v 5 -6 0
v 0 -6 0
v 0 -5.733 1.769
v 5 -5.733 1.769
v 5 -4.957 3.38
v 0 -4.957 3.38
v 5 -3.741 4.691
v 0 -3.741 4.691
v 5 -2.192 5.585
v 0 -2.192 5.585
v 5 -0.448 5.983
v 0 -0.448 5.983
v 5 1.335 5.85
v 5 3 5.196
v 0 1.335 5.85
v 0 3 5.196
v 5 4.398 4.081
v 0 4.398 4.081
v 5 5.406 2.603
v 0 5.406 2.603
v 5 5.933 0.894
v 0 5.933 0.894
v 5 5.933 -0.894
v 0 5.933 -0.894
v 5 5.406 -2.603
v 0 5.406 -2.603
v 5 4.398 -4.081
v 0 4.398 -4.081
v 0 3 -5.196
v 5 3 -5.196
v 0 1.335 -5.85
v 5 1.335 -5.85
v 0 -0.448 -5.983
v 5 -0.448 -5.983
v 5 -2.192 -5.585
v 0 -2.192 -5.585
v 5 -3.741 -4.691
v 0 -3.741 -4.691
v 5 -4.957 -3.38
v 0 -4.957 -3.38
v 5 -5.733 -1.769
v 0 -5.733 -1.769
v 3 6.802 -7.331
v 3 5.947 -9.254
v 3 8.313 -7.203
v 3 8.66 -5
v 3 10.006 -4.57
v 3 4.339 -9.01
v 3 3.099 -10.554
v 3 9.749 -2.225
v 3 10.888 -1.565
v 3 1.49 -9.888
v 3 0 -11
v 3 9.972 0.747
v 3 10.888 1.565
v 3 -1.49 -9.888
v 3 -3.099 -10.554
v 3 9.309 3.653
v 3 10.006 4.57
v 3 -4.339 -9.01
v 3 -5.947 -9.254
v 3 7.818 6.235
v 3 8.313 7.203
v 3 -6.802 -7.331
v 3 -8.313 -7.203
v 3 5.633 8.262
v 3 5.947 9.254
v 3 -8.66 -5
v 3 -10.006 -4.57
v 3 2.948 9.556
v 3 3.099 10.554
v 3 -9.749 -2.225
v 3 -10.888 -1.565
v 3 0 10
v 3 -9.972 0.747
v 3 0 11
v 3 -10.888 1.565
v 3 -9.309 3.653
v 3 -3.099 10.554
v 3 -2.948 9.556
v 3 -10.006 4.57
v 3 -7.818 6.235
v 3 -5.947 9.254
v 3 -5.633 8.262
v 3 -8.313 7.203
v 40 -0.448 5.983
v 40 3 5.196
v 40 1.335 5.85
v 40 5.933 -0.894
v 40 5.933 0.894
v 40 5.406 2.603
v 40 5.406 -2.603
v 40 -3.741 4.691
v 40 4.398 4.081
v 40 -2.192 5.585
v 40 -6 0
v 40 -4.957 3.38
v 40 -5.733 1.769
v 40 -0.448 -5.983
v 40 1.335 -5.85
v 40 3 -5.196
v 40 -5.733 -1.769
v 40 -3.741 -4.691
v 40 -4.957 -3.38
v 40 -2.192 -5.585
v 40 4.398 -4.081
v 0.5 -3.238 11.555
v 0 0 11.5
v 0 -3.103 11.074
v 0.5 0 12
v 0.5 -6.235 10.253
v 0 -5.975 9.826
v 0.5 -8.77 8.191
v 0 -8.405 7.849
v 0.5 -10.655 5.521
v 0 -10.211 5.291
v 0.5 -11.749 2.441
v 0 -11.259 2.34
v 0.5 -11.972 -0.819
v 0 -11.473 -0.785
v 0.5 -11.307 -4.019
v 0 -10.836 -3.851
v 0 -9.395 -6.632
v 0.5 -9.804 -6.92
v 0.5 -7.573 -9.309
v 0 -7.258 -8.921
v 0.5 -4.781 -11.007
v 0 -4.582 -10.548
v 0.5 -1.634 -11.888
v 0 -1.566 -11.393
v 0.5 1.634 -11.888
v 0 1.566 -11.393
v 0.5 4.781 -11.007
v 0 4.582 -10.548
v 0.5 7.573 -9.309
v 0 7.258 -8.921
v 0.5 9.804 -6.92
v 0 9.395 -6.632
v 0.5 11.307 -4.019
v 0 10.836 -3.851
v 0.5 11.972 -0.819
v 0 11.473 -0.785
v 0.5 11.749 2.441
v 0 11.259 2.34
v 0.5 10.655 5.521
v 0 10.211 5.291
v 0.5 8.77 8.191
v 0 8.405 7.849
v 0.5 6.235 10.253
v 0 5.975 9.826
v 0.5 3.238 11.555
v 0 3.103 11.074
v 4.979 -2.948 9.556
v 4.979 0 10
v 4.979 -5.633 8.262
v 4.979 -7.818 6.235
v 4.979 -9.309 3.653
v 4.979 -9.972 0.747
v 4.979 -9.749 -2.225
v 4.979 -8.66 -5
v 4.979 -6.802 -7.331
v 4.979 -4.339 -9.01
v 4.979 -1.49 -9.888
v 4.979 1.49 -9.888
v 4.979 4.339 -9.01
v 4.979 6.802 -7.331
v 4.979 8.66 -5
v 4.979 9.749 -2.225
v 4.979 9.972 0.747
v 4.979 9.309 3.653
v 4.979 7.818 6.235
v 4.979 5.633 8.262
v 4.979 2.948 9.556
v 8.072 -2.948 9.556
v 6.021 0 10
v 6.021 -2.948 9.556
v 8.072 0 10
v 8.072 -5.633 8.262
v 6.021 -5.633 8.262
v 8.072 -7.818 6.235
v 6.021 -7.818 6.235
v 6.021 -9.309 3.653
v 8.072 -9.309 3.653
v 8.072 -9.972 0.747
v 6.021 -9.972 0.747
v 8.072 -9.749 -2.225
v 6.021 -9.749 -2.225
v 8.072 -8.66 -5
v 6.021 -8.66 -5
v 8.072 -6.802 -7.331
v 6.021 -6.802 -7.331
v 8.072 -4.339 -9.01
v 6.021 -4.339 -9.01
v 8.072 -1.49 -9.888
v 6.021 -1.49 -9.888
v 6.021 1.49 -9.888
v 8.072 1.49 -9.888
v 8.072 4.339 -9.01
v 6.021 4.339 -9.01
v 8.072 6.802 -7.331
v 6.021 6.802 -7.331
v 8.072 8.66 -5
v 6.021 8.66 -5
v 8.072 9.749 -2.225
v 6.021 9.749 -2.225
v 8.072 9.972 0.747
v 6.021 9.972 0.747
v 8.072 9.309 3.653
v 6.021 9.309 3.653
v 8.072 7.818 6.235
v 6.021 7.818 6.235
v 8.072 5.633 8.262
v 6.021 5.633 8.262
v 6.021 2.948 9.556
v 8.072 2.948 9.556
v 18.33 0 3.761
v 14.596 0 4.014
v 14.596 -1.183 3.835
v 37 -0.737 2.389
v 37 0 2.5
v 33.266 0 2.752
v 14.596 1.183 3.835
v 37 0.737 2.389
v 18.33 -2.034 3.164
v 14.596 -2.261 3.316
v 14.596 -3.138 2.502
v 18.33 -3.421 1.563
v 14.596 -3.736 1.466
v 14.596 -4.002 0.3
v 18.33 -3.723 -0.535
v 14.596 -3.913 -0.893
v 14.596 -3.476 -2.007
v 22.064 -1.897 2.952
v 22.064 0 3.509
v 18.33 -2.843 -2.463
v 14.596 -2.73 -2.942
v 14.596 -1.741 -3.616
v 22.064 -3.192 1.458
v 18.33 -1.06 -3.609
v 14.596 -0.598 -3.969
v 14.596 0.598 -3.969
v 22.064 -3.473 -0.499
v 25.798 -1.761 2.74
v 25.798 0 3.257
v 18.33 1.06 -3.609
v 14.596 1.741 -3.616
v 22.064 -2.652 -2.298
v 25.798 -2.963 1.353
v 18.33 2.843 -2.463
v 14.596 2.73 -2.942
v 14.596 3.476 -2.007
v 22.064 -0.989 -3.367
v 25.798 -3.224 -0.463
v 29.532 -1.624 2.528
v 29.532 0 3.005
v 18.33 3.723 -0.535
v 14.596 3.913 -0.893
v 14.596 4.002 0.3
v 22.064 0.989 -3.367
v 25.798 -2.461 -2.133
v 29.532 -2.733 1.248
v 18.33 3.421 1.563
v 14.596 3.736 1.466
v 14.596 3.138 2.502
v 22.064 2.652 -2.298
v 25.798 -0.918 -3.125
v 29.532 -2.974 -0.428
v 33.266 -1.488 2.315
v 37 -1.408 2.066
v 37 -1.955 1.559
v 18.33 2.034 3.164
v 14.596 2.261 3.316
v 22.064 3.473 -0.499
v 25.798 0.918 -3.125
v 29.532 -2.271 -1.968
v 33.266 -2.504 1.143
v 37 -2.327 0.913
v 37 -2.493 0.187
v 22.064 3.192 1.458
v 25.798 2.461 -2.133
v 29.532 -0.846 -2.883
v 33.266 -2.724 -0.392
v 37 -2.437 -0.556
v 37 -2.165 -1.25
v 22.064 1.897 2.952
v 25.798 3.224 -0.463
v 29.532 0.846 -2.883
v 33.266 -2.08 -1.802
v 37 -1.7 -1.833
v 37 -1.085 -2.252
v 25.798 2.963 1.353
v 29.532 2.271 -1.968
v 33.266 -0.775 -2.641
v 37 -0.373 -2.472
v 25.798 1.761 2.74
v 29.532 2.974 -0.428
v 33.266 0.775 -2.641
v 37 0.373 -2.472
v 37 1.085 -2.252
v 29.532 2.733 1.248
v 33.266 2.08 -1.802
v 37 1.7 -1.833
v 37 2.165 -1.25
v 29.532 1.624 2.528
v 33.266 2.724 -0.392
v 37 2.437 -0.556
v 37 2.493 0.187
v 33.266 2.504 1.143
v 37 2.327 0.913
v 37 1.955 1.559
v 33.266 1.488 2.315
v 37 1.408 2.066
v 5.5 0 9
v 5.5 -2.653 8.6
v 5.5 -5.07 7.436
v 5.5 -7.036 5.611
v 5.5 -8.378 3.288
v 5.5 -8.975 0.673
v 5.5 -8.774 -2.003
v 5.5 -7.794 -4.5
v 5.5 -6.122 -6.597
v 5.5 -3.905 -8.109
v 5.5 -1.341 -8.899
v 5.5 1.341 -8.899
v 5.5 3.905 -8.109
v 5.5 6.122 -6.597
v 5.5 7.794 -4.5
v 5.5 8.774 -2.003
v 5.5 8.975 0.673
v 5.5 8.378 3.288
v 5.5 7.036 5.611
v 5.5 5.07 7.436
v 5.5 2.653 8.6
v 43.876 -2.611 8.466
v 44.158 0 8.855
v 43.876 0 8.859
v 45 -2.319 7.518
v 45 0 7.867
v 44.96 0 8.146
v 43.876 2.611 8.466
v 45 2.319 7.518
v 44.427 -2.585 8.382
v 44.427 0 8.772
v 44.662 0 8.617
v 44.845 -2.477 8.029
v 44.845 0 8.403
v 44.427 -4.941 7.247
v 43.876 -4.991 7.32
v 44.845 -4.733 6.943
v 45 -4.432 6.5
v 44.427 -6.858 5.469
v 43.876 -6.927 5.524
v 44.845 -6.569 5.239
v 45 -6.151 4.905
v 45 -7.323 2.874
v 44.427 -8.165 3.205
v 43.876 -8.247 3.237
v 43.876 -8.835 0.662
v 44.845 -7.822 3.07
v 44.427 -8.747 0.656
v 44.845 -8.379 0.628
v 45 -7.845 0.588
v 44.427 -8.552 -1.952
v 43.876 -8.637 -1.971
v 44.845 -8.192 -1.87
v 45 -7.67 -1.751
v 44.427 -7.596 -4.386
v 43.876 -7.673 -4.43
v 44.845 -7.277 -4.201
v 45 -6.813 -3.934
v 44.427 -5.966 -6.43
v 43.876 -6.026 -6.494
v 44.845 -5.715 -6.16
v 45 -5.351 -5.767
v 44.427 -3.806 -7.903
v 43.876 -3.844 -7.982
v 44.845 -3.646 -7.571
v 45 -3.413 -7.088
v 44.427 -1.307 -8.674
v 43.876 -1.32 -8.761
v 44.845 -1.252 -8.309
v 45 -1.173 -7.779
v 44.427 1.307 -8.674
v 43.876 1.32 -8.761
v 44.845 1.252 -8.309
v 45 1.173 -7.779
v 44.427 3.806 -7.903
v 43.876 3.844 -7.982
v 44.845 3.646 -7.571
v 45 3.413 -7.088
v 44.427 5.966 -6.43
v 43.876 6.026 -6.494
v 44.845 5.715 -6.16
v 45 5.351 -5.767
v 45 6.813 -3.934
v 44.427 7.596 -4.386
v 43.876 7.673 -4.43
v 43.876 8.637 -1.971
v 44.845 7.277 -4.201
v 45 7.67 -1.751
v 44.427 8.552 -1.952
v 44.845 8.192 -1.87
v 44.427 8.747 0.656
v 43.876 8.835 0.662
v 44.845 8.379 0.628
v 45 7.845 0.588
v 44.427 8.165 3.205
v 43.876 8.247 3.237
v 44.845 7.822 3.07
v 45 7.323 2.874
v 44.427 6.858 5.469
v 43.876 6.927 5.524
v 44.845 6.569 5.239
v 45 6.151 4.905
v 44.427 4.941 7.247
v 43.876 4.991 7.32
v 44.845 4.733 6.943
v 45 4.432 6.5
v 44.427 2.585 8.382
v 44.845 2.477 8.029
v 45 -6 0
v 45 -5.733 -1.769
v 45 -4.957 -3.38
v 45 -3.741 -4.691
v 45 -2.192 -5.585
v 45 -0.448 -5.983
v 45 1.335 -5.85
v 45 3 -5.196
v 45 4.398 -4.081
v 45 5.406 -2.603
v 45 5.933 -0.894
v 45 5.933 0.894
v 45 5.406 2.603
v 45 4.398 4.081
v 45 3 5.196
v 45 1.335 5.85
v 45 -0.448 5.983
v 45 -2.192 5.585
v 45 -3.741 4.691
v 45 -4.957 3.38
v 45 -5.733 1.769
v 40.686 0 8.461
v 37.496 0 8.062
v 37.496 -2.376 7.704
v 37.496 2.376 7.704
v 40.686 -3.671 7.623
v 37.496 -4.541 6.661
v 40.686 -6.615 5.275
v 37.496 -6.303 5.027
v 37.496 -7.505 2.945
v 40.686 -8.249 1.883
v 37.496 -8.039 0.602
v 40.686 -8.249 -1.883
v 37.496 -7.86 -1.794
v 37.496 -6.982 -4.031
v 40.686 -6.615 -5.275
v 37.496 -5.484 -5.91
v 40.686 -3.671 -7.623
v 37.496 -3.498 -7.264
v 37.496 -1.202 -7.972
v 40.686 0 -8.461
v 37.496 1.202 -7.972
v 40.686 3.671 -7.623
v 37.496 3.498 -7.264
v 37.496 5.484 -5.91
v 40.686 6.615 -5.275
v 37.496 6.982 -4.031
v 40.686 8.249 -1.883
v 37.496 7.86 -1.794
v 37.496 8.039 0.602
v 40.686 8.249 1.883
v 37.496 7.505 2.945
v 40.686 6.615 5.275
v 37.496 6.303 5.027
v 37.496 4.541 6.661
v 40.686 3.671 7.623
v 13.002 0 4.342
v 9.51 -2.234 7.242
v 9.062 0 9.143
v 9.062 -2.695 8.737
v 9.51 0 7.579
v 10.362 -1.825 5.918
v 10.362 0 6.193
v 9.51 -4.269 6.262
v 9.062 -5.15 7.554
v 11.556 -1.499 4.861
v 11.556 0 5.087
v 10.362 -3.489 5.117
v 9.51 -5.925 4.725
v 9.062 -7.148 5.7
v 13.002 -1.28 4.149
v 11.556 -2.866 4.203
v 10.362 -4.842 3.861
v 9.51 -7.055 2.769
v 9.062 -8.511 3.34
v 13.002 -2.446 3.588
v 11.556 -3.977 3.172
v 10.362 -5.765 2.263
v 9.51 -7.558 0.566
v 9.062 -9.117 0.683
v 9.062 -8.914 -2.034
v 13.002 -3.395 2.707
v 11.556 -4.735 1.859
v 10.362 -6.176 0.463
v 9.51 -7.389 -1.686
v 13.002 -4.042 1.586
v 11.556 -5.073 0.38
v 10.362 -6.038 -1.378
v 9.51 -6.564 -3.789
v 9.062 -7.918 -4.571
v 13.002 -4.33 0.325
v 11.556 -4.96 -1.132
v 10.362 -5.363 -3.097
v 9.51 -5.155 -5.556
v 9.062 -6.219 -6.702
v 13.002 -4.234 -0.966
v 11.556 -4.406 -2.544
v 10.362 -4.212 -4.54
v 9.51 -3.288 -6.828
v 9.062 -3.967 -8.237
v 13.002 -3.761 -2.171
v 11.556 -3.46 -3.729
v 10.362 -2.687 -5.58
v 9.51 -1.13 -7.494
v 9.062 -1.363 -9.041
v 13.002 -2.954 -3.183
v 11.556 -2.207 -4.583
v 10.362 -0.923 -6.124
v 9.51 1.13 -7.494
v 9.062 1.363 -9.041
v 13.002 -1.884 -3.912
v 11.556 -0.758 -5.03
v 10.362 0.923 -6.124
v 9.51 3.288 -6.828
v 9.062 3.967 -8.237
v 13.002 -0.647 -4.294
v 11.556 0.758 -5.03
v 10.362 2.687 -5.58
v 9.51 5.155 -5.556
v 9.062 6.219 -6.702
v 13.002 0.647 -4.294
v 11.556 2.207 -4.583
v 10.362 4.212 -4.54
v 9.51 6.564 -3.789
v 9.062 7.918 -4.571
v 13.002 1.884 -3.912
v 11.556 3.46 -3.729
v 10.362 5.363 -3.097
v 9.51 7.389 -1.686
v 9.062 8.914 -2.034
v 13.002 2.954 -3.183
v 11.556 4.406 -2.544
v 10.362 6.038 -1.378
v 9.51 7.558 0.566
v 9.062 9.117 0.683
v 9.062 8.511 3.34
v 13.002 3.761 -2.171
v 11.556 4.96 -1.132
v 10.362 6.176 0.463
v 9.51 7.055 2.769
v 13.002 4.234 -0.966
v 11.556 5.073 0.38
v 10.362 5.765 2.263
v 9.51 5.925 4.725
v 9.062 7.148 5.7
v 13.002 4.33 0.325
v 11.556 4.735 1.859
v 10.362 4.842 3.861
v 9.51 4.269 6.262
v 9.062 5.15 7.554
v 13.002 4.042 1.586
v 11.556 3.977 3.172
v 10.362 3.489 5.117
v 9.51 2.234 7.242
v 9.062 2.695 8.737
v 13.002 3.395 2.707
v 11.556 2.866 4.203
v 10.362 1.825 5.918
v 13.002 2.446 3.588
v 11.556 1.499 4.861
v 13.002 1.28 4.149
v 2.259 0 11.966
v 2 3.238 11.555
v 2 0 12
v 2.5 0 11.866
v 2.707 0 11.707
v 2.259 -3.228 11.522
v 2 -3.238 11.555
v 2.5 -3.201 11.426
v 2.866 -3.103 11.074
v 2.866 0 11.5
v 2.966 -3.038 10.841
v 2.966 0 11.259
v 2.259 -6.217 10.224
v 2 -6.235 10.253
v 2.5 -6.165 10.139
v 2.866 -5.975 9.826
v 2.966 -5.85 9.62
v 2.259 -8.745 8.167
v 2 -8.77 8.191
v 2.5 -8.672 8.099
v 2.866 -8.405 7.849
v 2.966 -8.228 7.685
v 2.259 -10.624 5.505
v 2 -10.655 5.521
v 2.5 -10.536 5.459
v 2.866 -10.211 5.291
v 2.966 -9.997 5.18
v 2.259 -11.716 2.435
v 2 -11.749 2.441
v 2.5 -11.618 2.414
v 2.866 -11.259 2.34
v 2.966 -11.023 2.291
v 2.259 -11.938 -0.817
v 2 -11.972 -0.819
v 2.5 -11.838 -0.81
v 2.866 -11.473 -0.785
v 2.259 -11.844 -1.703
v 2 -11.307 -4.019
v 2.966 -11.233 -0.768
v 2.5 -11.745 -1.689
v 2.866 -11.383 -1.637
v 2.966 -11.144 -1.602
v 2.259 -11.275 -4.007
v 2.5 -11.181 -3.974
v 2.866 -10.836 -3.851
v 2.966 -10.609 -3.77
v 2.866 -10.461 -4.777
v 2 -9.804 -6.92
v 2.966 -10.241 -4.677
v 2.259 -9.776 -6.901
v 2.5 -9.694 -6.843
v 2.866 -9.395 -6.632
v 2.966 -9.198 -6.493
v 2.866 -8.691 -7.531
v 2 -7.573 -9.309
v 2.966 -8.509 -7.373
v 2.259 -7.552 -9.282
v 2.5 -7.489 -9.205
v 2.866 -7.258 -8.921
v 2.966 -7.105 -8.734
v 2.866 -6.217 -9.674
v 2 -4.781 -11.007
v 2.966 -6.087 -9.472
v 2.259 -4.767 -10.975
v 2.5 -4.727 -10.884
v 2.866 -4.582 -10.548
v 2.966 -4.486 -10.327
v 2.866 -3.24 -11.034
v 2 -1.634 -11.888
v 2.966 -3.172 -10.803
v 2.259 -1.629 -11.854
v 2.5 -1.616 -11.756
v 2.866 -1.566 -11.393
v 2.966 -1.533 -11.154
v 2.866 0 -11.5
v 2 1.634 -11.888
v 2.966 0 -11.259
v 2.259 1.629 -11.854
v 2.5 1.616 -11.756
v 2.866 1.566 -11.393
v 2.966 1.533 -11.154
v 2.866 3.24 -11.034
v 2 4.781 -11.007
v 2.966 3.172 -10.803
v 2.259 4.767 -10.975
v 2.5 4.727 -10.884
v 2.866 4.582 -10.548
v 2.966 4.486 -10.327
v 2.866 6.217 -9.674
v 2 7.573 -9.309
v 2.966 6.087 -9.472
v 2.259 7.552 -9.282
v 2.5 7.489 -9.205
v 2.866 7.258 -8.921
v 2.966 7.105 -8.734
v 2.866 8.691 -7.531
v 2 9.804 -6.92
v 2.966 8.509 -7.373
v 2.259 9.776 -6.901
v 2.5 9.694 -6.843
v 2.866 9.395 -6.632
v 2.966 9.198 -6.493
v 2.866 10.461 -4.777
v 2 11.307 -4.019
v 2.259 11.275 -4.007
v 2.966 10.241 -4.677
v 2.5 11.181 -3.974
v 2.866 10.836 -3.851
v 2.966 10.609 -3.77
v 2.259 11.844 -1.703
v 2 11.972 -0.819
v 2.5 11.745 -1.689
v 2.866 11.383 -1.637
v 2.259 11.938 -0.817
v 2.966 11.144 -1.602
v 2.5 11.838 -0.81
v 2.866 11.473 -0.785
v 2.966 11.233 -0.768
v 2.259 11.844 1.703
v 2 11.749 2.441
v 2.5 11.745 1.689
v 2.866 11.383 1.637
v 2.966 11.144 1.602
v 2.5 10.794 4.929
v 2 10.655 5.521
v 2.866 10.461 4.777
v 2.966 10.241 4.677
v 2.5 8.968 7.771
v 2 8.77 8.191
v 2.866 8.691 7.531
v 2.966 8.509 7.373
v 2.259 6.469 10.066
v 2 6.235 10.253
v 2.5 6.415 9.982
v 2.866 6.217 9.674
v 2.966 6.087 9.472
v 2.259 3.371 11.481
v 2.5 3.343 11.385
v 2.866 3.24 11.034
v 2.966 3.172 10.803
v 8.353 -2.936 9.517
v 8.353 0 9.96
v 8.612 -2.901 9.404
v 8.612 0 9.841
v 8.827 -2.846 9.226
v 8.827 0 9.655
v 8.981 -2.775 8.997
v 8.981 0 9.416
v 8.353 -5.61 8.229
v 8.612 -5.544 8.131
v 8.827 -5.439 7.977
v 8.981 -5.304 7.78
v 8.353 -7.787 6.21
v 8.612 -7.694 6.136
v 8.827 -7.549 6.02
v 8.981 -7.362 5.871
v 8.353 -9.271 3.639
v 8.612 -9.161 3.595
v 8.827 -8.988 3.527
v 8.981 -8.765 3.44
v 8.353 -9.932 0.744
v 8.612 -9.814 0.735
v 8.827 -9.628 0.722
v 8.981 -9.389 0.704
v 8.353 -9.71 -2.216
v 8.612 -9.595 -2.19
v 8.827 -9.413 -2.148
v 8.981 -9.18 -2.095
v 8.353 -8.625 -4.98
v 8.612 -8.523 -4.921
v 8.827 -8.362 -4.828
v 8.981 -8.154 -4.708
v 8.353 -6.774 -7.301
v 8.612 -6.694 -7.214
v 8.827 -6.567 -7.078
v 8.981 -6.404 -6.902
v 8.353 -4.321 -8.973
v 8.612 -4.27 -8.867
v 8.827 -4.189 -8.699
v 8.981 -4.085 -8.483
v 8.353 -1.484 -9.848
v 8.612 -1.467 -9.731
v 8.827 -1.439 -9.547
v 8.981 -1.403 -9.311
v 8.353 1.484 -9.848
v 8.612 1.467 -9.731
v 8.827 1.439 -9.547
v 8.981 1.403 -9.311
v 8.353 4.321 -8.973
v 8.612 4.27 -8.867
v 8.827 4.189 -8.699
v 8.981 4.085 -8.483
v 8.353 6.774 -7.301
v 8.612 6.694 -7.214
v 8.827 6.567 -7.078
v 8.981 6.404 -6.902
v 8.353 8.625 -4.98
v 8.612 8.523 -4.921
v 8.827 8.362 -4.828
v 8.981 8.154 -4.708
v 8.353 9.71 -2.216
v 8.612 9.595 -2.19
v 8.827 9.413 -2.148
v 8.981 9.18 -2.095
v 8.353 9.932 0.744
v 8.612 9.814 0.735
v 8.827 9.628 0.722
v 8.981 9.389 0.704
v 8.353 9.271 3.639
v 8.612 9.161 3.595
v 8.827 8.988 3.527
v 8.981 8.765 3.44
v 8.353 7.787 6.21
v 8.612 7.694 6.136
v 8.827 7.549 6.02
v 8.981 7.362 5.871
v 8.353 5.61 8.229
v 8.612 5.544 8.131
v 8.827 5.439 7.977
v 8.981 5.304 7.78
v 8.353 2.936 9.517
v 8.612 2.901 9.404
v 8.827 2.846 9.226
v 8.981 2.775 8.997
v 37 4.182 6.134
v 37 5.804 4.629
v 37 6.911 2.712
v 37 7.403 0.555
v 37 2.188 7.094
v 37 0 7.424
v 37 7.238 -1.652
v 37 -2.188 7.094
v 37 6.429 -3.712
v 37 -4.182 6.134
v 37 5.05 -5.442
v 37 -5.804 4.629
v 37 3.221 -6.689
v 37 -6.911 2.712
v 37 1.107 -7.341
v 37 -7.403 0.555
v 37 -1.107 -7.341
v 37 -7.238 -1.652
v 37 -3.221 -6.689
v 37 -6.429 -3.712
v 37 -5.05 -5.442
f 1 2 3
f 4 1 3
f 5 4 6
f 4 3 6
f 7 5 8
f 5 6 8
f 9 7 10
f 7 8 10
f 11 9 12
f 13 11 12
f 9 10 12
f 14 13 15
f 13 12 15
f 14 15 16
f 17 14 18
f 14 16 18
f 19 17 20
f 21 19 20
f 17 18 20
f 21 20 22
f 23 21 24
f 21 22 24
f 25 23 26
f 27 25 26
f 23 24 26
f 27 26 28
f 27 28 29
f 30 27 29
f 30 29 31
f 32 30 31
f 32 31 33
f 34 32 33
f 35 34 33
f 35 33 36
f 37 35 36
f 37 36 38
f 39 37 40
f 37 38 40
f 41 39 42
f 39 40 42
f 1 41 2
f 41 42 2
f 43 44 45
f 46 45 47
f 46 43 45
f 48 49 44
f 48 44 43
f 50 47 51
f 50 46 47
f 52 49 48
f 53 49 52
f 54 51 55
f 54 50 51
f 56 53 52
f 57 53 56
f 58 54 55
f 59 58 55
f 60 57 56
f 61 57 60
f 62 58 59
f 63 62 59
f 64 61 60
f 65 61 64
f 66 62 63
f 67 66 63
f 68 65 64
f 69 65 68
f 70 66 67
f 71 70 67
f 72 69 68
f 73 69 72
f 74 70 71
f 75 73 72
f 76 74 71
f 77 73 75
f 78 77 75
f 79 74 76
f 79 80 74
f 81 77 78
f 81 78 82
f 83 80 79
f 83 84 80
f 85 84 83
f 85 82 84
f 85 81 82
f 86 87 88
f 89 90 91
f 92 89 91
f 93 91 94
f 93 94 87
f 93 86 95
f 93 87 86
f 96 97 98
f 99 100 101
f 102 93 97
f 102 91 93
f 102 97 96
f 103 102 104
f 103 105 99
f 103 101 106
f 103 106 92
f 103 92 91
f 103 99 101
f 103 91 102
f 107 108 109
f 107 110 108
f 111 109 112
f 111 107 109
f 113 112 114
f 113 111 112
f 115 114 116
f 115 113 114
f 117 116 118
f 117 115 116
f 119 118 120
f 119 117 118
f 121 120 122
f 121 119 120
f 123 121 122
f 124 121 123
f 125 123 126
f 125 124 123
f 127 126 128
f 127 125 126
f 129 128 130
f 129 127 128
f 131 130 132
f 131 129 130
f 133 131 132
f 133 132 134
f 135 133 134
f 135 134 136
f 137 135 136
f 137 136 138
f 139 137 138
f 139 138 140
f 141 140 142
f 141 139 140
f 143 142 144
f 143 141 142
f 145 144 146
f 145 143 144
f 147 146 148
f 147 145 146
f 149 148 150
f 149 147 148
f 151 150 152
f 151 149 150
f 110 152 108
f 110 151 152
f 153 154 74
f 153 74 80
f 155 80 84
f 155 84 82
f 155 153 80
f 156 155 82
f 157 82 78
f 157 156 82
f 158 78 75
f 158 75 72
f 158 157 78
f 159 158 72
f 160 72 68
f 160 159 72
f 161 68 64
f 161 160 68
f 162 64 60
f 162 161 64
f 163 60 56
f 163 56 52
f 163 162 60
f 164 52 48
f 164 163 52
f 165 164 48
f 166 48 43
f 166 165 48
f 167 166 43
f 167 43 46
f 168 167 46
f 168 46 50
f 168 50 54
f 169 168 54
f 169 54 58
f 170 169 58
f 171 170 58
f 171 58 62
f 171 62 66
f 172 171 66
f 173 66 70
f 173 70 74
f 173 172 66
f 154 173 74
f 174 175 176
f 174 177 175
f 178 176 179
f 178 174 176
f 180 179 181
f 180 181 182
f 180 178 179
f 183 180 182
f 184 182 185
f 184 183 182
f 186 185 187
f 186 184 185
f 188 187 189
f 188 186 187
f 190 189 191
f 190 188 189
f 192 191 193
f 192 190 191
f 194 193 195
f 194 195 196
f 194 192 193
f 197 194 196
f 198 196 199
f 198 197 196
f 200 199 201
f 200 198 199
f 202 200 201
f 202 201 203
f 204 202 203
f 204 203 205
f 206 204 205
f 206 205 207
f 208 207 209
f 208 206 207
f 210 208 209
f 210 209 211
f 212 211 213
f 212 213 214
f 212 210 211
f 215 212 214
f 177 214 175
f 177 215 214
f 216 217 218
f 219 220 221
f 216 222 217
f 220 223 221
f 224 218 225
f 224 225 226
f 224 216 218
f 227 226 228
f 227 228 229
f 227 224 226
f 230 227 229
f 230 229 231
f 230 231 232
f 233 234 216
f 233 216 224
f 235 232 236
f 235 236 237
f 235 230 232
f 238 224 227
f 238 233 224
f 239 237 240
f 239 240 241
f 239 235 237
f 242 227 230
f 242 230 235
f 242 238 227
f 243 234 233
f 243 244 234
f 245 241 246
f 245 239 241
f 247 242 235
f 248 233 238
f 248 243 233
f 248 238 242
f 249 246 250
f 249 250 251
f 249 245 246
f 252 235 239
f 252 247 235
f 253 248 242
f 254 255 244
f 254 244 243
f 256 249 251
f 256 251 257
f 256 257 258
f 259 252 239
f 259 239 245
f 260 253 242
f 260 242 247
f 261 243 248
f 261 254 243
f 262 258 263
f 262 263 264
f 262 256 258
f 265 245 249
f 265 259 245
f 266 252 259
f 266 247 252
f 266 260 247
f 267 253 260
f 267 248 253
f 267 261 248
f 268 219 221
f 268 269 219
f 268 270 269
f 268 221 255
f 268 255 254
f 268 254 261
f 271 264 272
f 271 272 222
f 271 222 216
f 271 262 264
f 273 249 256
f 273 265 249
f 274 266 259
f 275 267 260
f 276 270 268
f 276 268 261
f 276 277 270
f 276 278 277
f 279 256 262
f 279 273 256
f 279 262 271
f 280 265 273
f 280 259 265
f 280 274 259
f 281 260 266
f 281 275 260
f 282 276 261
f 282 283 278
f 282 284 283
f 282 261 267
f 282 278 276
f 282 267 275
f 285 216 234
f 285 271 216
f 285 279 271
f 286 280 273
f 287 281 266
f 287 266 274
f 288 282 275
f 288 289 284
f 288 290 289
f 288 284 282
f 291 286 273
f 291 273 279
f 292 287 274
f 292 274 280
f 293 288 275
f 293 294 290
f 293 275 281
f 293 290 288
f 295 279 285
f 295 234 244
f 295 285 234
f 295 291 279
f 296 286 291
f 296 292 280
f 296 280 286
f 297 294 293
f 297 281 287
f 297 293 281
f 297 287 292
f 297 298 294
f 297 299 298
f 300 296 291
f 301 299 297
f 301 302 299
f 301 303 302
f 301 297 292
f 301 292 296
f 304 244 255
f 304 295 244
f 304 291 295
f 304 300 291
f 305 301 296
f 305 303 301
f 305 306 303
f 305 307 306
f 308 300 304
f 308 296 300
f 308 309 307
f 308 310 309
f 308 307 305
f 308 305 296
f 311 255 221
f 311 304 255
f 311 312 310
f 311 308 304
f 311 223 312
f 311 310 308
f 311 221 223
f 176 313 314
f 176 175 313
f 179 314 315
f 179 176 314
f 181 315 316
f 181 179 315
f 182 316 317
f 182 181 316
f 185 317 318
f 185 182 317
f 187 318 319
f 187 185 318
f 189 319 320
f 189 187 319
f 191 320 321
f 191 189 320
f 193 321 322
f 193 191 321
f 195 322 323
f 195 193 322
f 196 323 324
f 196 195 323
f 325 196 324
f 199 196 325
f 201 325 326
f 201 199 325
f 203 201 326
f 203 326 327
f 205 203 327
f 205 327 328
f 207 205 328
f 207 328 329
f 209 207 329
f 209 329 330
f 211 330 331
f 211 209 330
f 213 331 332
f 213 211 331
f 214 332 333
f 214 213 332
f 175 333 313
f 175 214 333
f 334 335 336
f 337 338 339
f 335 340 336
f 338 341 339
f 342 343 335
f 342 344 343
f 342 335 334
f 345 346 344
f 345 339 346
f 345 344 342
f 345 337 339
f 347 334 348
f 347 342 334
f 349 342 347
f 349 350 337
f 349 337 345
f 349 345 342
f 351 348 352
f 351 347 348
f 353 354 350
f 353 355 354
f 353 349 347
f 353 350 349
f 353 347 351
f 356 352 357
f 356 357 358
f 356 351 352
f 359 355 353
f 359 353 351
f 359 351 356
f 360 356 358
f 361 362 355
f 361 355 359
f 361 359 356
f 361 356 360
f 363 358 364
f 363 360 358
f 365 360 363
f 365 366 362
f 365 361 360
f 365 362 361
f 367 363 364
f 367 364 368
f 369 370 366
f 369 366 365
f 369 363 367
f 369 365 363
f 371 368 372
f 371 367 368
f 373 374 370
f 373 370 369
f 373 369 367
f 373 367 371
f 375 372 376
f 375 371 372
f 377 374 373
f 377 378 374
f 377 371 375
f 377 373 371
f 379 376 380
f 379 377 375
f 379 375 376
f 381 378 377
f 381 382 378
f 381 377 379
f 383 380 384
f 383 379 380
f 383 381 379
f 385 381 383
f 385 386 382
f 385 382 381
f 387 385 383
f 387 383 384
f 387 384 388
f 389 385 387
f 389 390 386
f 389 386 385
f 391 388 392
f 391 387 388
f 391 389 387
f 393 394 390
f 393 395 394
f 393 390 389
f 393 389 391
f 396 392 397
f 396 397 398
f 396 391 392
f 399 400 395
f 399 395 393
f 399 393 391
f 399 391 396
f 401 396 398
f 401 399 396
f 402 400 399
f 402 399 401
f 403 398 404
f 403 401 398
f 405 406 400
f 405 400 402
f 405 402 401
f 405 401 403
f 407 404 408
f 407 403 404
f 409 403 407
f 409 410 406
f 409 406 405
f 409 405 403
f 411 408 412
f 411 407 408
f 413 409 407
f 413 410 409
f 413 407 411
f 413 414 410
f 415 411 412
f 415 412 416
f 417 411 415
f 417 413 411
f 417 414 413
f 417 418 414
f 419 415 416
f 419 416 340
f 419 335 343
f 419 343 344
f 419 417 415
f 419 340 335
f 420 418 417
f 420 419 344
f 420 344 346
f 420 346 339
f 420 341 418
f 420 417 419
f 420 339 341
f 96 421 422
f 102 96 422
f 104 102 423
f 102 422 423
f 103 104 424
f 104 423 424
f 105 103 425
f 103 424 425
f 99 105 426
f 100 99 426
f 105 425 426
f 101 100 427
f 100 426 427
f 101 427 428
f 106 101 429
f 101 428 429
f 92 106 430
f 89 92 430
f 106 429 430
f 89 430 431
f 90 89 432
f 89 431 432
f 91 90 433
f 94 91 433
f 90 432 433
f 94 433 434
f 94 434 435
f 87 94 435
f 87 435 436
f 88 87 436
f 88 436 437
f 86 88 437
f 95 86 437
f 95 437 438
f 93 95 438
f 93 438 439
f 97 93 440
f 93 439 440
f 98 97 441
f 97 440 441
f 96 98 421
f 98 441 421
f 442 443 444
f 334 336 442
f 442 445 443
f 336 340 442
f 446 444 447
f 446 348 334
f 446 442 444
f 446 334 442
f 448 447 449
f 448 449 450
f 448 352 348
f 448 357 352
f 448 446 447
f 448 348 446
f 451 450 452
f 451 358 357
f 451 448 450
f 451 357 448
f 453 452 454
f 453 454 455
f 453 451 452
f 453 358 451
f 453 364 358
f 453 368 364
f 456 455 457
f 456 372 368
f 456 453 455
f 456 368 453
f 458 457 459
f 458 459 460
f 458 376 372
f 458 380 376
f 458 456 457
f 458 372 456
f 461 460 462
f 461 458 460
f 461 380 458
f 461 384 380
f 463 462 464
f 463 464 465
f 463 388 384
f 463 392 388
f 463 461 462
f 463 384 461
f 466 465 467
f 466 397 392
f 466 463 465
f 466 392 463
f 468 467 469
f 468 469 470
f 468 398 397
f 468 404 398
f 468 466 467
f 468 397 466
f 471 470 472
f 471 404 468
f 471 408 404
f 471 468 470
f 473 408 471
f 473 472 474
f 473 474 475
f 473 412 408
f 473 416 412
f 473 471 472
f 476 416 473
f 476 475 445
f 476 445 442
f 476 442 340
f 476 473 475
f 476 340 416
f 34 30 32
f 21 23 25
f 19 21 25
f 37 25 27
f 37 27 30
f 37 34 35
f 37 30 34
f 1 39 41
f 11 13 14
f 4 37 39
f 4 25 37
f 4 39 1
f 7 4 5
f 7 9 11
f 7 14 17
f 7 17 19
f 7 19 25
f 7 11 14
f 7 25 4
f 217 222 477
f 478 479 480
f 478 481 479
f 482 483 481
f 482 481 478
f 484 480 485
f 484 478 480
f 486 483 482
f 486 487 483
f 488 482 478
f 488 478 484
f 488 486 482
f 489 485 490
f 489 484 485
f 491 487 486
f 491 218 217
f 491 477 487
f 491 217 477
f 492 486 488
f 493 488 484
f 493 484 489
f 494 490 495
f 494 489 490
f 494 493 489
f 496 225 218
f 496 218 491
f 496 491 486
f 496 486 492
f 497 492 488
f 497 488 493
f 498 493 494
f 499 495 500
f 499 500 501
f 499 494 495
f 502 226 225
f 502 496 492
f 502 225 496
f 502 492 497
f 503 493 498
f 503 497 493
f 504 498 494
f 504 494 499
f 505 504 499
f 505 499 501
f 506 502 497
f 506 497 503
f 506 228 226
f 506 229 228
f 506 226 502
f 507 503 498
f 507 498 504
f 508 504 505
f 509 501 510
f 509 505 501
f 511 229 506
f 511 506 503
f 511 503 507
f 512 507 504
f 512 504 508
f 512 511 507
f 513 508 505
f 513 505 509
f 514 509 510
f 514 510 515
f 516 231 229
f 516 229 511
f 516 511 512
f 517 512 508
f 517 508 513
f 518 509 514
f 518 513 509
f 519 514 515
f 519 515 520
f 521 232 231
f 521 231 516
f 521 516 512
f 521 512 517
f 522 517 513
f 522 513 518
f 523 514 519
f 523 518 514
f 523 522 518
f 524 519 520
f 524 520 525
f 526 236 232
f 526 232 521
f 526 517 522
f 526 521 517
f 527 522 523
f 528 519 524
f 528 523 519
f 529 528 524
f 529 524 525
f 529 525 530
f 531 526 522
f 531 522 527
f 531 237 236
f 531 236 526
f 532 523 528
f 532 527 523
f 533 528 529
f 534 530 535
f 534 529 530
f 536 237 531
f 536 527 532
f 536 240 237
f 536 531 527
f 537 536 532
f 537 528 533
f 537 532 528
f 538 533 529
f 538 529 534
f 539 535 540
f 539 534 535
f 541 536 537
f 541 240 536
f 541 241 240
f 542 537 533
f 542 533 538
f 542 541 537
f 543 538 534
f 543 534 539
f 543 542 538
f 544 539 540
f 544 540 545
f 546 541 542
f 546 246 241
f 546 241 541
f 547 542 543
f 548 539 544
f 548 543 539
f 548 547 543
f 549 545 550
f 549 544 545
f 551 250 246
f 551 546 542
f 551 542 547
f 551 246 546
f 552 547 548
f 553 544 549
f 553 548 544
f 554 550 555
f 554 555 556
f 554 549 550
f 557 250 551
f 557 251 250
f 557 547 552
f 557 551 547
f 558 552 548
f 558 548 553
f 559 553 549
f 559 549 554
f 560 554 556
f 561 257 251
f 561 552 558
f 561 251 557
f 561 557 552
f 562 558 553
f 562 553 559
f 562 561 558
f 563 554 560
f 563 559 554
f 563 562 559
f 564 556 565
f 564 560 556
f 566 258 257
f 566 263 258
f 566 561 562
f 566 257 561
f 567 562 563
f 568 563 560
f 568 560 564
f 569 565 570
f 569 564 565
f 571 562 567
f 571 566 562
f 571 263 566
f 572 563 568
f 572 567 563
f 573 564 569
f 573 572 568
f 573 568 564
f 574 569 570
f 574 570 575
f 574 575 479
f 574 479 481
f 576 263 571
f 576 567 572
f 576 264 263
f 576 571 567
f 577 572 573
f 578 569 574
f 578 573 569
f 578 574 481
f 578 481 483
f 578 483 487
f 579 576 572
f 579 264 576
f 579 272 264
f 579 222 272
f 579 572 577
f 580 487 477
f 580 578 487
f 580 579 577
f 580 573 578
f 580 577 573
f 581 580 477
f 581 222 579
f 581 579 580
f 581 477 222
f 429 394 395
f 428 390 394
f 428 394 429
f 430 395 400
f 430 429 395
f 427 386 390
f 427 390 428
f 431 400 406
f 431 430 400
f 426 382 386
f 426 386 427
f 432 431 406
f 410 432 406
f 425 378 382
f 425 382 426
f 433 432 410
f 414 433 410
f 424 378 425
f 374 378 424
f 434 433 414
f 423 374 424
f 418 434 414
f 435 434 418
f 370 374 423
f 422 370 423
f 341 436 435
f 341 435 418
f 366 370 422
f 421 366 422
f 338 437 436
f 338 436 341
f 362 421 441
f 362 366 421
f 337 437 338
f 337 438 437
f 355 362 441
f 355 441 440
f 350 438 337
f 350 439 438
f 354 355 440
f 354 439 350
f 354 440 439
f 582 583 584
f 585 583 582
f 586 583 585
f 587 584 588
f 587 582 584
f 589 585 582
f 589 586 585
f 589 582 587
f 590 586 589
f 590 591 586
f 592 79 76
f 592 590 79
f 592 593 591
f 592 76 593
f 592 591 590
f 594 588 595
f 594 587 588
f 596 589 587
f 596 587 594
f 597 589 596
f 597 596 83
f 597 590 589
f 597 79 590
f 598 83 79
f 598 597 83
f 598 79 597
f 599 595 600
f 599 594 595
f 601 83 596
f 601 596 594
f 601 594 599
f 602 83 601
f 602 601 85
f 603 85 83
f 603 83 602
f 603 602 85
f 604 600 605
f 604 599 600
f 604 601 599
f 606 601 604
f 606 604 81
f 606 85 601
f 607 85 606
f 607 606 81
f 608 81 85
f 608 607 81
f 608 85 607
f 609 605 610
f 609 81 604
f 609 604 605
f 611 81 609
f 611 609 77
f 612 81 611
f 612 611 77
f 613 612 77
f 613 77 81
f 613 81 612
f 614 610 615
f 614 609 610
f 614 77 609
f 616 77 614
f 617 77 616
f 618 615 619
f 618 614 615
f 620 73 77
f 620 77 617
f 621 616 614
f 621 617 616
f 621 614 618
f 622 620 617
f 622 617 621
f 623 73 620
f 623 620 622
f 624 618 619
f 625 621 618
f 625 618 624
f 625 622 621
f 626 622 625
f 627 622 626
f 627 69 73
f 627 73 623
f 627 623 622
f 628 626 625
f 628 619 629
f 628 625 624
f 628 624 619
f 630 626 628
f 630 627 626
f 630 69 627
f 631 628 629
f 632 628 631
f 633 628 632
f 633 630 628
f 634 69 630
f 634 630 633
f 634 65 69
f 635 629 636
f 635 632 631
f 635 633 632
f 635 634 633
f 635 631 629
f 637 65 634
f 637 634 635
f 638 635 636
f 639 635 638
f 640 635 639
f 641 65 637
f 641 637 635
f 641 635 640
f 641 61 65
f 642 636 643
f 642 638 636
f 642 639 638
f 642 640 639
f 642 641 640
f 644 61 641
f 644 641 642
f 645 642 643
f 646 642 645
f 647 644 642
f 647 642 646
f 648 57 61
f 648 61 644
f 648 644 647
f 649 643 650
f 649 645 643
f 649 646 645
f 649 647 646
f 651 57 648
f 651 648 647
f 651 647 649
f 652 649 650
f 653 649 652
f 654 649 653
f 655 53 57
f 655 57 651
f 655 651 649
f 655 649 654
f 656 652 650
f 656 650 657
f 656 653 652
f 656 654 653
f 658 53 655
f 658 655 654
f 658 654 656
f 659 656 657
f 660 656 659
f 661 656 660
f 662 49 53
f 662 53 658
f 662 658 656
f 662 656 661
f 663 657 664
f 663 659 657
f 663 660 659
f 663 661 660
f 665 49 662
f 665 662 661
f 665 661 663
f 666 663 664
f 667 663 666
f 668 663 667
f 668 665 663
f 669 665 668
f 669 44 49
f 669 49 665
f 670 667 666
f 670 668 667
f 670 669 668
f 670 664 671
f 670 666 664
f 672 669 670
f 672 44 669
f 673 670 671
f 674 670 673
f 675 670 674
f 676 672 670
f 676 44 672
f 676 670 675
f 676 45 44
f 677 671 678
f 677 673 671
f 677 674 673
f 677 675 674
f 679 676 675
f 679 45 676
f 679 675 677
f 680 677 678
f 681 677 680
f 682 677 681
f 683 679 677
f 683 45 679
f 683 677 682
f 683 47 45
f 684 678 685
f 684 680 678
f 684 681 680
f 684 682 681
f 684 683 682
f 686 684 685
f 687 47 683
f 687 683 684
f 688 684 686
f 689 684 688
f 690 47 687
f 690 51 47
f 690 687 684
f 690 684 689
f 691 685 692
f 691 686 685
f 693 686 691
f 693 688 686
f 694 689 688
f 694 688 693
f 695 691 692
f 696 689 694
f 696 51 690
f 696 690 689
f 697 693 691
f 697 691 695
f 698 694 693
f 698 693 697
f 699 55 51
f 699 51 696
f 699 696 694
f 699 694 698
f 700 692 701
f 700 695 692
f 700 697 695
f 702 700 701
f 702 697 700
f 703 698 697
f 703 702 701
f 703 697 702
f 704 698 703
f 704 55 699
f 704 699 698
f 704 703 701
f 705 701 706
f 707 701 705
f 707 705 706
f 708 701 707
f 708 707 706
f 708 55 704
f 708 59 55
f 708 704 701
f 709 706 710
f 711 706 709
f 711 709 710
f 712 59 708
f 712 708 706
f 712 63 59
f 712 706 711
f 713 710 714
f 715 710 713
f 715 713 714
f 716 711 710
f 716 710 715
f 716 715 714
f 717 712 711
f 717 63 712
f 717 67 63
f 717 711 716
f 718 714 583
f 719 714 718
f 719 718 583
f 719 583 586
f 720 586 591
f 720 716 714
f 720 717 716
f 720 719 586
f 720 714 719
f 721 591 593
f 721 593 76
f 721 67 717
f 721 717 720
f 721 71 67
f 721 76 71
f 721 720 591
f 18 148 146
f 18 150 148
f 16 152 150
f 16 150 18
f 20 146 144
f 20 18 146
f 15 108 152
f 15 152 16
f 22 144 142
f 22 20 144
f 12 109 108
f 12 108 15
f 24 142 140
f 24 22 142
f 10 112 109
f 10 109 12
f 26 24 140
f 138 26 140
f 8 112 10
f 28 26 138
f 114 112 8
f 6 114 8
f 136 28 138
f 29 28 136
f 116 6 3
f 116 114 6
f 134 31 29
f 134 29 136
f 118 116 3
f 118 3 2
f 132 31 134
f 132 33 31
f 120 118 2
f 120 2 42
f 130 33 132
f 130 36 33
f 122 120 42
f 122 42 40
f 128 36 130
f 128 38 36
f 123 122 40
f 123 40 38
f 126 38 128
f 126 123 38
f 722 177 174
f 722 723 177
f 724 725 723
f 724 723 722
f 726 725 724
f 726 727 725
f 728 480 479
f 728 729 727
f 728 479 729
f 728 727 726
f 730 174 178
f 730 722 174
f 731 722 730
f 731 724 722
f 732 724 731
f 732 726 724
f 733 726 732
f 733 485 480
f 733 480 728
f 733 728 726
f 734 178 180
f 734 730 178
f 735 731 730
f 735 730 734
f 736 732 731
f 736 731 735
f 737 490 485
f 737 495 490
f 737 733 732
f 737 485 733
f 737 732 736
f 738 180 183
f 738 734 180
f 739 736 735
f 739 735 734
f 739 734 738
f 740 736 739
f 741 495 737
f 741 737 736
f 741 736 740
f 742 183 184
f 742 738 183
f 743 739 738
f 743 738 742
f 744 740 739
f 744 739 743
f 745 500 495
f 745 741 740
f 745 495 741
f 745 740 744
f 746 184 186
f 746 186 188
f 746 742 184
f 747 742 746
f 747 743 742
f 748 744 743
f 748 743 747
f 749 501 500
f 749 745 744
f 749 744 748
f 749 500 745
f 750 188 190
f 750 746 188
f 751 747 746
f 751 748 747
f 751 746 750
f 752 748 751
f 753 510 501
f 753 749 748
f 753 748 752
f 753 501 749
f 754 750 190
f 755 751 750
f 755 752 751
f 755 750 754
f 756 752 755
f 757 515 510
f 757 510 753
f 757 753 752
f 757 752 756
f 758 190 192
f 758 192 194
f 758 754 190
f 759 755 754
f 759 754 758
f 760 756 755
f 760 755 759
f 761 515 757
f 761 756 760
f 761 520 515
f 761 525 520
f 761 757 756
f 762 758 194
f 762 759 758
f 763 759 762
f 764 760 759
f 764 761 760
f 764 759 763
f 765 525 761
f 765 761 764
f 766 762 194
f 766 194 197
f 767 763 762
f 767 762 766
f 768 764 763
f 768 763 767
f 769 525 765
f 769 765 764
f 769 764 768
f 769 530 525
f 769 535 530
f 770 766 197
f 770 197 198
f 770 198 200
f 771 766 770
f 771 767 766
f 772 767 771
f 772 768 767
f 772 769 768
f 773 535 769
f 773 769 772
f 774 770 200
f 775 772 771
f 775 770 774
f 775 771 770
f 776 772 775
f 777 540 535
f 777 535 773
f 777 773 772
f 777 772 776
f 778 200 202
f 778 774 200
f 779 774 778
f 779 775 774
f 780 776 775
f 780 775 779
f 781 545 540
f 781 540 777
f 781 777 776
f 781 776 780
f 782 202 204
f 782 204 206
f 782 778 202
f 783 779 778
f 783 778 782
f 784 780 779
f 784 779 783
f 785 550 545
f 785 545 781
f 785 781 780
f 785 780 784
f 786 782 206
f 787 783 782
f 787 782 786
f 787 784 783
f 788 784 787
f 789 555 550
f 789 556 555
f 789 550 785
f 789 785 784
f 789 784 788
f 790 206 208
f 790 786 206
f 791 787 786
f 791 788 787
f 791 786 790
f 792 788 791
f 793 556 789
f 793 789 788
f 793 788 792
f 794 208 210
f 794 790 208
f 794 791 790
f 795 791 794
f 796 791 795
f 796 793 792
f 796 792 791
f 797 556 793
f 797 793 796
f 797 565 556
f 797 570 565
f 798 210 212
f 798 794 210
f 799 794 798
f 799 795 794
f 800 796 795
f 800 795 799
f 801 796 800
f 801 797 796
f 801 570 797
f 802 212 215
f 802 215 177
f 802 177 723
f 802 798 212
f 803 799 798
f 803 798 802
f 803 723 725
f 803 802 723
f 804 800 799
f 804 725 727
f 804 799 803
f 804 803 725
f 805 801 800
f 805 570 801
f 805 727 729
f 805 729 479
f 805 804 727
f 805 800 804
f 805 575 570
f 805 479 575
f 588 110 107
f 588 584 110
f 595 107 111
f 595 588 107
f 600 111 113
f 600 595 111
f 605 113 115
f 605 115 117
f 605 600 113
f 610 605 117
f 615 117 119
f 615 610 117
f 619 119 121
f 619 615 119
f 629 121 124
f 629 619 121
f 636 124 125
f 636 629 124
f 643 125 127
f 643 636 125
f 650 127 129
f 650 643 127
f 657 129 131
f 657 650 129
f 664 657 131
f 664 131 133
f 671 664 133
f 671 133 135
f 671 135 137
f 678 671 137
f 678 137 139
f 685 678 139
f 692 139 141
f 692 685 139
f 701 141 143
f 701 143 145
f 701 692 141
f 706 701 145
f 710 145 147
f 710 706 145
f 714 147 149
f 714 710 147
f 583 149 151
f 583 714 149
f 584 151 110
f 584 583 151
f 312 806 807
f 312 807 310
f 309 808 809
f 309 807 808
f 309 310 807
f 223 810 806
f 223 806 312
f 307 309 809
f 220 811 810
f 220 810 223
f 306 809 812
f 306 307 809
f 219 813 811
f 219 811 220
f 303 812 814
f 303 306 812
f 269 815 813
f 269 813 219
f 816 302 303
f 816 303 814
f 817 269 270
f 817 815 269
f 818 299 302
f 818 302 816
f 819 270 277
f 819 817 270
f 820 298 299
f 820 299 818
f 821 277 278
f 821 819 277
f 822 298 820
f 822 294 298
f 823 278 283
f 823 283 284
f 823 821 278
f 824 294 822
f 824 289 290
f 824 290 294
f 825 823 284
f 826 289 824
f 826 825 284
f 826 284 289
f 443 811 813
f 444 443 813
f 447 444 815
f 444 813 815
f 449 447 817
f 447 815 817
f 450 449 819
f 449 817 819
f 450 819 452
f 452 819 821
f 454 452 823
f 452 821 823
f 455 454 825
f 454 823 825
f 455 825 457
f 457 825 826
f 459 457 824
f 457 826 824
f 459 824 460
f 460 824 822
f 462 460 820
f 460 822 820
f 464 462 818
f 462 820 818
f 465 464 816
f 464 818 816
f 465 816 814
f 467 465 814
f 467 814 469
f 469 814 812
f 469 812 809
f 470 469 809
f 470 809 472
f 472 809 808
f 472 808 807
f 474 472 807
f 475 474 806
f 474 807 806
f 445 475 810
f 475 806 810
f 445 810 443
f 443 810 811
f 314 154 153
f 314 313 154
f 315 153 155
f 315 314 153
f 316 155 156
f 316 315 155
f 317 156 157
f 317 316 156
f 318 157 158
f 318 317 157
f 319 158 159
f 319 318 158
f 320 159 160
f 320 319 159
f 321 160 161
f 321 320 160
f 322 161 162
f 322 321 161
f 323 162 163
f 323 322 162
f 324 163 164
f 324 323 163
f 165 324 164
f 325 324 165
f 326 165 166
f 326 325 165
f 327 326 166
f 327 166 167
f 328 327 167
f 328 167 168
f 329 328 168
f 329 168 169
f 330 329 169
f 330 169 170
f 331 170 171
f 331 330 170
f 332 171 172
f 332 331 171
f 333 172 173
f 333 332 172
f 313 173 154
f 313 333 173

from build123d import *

# Parameters (mm, degrees)
SKETCH3_R          = 6
CUT_EXTRUDE1_DEPTH = 5
SKETCH4_R          = 6
CUT_EXTRUDE2_DEPTH = 5
FILLET1_R          = 1
CHAMFER1_SIZE      = 0.5
CHAMFER1_SIZE2     = 0.575875553


with BuildPart() as part:
    # Sketch1 → Revolve1 (revolve)
    with BuildSketch(Plane.XY, mode=Mode.PRIVATE) as revolve1_sk:
        with BuildLine():
            Line((0, 0), (0, 11.5))
            Line((0, 11.5), (0.5, 12))
            Line((0.5, 12), (2, 12))
            ThreePointArc((2, 12), (2.707106781, 11.707106781), (3, 11))
            Line((3, 11), (3, 10))
            Line((3, 10), (8.07179677, 10))
            ThreePointArc((8.07179677, 10), (8.72645044, 9.755928946), (9.061540088, 9.142857143))
            ThreePointArc((9.061540088, 9.142857143), (10.921361567, 5.599464972), (14.595561276, 4.013646409))
            Line((14.595561276, 4.013646409), (37, 2.5))
            Line((37, 2.5), (37, 8))
            Line((37, 8), (45, 9))
            Line((45, 9), (45, 0))
            Line((45, 0), (0, 0))
        make_face()
    revolve(revolve1_sk.sketch.rotate(Axis((0, 0, 0), (1, 0, 0)), 90), axis=Axis((0, 0, 0), (1, 0, 0)))  # turned: the seam where the file's is

    # Sketch2 → Cut-Revolve1 (revolve, cut)
    with BuildSketch(Plane.XY, mode=Mode.PRIVATE) as cut_revolve1_sk:
        Polygon((4.979432949, 10), (5.5, 9), (6.020567051, 10), align=None)
    revolve(cut_revolve1_sk.sketch.rotate(Axis((0, 0, 0), (1, 0, 0)), 90), axis=Axis((0, 0, 0), (1, 0, 0)), mode=Mode.SUBTRACT)  # turned: the seam where the file's is

    # Sketch3 → Cut-Extrude1 (cut)
    with BuildSketch(Plane.ZY):
        with Locations(Location((0, 0, 0), (0, 0, 270))):  # turned: the seam where the file's is
            Circle(SKETCH3_R)
    extrude(amount=-CUT_EXTRUDE1_DEPTH, mode=Mode.SUBTRACT)

    # Sketch4 → Cut-Extrude2 (cut)
    with BuildSketch(Plane(origin=(45, 0, 0), x_dir=(0, 0, -1), z_dir=(1, 0, 0))):
        with Locations(Location((0, 0, 0), (0, 0, 270))):  # turned: the seam where the file's is
            Circle(SKETCH4_R)
    extrude(amount=-CUT_EXTRUDE2_DEPTH, mode=Mode.SUBTRACT)

    # Fillet1
    fillet1_edges = [part.edges().sort_by_distance(p)[0] for p in [
        (45, 0, -9),
    ]]
    fillet(fillet1_edges, radius=FILLET1_R)

    # Chamfer1
    chamfer1_edges = [part.edges().sort_by_distance(p)[0] for p in [
        (37, 0, -8),
    ]]
    chamfer1_side = [part.faces().sort_by_distance(p)[0] for p in [
        (40.437982633, 0, -8.429747829),
    ]]
    chamfer(chamfer1_edges, length=CHAMFER1_SIZE, length2=CHAMFER1_SIZE2, reference=chamfer1_side[0])


solid = part.part
